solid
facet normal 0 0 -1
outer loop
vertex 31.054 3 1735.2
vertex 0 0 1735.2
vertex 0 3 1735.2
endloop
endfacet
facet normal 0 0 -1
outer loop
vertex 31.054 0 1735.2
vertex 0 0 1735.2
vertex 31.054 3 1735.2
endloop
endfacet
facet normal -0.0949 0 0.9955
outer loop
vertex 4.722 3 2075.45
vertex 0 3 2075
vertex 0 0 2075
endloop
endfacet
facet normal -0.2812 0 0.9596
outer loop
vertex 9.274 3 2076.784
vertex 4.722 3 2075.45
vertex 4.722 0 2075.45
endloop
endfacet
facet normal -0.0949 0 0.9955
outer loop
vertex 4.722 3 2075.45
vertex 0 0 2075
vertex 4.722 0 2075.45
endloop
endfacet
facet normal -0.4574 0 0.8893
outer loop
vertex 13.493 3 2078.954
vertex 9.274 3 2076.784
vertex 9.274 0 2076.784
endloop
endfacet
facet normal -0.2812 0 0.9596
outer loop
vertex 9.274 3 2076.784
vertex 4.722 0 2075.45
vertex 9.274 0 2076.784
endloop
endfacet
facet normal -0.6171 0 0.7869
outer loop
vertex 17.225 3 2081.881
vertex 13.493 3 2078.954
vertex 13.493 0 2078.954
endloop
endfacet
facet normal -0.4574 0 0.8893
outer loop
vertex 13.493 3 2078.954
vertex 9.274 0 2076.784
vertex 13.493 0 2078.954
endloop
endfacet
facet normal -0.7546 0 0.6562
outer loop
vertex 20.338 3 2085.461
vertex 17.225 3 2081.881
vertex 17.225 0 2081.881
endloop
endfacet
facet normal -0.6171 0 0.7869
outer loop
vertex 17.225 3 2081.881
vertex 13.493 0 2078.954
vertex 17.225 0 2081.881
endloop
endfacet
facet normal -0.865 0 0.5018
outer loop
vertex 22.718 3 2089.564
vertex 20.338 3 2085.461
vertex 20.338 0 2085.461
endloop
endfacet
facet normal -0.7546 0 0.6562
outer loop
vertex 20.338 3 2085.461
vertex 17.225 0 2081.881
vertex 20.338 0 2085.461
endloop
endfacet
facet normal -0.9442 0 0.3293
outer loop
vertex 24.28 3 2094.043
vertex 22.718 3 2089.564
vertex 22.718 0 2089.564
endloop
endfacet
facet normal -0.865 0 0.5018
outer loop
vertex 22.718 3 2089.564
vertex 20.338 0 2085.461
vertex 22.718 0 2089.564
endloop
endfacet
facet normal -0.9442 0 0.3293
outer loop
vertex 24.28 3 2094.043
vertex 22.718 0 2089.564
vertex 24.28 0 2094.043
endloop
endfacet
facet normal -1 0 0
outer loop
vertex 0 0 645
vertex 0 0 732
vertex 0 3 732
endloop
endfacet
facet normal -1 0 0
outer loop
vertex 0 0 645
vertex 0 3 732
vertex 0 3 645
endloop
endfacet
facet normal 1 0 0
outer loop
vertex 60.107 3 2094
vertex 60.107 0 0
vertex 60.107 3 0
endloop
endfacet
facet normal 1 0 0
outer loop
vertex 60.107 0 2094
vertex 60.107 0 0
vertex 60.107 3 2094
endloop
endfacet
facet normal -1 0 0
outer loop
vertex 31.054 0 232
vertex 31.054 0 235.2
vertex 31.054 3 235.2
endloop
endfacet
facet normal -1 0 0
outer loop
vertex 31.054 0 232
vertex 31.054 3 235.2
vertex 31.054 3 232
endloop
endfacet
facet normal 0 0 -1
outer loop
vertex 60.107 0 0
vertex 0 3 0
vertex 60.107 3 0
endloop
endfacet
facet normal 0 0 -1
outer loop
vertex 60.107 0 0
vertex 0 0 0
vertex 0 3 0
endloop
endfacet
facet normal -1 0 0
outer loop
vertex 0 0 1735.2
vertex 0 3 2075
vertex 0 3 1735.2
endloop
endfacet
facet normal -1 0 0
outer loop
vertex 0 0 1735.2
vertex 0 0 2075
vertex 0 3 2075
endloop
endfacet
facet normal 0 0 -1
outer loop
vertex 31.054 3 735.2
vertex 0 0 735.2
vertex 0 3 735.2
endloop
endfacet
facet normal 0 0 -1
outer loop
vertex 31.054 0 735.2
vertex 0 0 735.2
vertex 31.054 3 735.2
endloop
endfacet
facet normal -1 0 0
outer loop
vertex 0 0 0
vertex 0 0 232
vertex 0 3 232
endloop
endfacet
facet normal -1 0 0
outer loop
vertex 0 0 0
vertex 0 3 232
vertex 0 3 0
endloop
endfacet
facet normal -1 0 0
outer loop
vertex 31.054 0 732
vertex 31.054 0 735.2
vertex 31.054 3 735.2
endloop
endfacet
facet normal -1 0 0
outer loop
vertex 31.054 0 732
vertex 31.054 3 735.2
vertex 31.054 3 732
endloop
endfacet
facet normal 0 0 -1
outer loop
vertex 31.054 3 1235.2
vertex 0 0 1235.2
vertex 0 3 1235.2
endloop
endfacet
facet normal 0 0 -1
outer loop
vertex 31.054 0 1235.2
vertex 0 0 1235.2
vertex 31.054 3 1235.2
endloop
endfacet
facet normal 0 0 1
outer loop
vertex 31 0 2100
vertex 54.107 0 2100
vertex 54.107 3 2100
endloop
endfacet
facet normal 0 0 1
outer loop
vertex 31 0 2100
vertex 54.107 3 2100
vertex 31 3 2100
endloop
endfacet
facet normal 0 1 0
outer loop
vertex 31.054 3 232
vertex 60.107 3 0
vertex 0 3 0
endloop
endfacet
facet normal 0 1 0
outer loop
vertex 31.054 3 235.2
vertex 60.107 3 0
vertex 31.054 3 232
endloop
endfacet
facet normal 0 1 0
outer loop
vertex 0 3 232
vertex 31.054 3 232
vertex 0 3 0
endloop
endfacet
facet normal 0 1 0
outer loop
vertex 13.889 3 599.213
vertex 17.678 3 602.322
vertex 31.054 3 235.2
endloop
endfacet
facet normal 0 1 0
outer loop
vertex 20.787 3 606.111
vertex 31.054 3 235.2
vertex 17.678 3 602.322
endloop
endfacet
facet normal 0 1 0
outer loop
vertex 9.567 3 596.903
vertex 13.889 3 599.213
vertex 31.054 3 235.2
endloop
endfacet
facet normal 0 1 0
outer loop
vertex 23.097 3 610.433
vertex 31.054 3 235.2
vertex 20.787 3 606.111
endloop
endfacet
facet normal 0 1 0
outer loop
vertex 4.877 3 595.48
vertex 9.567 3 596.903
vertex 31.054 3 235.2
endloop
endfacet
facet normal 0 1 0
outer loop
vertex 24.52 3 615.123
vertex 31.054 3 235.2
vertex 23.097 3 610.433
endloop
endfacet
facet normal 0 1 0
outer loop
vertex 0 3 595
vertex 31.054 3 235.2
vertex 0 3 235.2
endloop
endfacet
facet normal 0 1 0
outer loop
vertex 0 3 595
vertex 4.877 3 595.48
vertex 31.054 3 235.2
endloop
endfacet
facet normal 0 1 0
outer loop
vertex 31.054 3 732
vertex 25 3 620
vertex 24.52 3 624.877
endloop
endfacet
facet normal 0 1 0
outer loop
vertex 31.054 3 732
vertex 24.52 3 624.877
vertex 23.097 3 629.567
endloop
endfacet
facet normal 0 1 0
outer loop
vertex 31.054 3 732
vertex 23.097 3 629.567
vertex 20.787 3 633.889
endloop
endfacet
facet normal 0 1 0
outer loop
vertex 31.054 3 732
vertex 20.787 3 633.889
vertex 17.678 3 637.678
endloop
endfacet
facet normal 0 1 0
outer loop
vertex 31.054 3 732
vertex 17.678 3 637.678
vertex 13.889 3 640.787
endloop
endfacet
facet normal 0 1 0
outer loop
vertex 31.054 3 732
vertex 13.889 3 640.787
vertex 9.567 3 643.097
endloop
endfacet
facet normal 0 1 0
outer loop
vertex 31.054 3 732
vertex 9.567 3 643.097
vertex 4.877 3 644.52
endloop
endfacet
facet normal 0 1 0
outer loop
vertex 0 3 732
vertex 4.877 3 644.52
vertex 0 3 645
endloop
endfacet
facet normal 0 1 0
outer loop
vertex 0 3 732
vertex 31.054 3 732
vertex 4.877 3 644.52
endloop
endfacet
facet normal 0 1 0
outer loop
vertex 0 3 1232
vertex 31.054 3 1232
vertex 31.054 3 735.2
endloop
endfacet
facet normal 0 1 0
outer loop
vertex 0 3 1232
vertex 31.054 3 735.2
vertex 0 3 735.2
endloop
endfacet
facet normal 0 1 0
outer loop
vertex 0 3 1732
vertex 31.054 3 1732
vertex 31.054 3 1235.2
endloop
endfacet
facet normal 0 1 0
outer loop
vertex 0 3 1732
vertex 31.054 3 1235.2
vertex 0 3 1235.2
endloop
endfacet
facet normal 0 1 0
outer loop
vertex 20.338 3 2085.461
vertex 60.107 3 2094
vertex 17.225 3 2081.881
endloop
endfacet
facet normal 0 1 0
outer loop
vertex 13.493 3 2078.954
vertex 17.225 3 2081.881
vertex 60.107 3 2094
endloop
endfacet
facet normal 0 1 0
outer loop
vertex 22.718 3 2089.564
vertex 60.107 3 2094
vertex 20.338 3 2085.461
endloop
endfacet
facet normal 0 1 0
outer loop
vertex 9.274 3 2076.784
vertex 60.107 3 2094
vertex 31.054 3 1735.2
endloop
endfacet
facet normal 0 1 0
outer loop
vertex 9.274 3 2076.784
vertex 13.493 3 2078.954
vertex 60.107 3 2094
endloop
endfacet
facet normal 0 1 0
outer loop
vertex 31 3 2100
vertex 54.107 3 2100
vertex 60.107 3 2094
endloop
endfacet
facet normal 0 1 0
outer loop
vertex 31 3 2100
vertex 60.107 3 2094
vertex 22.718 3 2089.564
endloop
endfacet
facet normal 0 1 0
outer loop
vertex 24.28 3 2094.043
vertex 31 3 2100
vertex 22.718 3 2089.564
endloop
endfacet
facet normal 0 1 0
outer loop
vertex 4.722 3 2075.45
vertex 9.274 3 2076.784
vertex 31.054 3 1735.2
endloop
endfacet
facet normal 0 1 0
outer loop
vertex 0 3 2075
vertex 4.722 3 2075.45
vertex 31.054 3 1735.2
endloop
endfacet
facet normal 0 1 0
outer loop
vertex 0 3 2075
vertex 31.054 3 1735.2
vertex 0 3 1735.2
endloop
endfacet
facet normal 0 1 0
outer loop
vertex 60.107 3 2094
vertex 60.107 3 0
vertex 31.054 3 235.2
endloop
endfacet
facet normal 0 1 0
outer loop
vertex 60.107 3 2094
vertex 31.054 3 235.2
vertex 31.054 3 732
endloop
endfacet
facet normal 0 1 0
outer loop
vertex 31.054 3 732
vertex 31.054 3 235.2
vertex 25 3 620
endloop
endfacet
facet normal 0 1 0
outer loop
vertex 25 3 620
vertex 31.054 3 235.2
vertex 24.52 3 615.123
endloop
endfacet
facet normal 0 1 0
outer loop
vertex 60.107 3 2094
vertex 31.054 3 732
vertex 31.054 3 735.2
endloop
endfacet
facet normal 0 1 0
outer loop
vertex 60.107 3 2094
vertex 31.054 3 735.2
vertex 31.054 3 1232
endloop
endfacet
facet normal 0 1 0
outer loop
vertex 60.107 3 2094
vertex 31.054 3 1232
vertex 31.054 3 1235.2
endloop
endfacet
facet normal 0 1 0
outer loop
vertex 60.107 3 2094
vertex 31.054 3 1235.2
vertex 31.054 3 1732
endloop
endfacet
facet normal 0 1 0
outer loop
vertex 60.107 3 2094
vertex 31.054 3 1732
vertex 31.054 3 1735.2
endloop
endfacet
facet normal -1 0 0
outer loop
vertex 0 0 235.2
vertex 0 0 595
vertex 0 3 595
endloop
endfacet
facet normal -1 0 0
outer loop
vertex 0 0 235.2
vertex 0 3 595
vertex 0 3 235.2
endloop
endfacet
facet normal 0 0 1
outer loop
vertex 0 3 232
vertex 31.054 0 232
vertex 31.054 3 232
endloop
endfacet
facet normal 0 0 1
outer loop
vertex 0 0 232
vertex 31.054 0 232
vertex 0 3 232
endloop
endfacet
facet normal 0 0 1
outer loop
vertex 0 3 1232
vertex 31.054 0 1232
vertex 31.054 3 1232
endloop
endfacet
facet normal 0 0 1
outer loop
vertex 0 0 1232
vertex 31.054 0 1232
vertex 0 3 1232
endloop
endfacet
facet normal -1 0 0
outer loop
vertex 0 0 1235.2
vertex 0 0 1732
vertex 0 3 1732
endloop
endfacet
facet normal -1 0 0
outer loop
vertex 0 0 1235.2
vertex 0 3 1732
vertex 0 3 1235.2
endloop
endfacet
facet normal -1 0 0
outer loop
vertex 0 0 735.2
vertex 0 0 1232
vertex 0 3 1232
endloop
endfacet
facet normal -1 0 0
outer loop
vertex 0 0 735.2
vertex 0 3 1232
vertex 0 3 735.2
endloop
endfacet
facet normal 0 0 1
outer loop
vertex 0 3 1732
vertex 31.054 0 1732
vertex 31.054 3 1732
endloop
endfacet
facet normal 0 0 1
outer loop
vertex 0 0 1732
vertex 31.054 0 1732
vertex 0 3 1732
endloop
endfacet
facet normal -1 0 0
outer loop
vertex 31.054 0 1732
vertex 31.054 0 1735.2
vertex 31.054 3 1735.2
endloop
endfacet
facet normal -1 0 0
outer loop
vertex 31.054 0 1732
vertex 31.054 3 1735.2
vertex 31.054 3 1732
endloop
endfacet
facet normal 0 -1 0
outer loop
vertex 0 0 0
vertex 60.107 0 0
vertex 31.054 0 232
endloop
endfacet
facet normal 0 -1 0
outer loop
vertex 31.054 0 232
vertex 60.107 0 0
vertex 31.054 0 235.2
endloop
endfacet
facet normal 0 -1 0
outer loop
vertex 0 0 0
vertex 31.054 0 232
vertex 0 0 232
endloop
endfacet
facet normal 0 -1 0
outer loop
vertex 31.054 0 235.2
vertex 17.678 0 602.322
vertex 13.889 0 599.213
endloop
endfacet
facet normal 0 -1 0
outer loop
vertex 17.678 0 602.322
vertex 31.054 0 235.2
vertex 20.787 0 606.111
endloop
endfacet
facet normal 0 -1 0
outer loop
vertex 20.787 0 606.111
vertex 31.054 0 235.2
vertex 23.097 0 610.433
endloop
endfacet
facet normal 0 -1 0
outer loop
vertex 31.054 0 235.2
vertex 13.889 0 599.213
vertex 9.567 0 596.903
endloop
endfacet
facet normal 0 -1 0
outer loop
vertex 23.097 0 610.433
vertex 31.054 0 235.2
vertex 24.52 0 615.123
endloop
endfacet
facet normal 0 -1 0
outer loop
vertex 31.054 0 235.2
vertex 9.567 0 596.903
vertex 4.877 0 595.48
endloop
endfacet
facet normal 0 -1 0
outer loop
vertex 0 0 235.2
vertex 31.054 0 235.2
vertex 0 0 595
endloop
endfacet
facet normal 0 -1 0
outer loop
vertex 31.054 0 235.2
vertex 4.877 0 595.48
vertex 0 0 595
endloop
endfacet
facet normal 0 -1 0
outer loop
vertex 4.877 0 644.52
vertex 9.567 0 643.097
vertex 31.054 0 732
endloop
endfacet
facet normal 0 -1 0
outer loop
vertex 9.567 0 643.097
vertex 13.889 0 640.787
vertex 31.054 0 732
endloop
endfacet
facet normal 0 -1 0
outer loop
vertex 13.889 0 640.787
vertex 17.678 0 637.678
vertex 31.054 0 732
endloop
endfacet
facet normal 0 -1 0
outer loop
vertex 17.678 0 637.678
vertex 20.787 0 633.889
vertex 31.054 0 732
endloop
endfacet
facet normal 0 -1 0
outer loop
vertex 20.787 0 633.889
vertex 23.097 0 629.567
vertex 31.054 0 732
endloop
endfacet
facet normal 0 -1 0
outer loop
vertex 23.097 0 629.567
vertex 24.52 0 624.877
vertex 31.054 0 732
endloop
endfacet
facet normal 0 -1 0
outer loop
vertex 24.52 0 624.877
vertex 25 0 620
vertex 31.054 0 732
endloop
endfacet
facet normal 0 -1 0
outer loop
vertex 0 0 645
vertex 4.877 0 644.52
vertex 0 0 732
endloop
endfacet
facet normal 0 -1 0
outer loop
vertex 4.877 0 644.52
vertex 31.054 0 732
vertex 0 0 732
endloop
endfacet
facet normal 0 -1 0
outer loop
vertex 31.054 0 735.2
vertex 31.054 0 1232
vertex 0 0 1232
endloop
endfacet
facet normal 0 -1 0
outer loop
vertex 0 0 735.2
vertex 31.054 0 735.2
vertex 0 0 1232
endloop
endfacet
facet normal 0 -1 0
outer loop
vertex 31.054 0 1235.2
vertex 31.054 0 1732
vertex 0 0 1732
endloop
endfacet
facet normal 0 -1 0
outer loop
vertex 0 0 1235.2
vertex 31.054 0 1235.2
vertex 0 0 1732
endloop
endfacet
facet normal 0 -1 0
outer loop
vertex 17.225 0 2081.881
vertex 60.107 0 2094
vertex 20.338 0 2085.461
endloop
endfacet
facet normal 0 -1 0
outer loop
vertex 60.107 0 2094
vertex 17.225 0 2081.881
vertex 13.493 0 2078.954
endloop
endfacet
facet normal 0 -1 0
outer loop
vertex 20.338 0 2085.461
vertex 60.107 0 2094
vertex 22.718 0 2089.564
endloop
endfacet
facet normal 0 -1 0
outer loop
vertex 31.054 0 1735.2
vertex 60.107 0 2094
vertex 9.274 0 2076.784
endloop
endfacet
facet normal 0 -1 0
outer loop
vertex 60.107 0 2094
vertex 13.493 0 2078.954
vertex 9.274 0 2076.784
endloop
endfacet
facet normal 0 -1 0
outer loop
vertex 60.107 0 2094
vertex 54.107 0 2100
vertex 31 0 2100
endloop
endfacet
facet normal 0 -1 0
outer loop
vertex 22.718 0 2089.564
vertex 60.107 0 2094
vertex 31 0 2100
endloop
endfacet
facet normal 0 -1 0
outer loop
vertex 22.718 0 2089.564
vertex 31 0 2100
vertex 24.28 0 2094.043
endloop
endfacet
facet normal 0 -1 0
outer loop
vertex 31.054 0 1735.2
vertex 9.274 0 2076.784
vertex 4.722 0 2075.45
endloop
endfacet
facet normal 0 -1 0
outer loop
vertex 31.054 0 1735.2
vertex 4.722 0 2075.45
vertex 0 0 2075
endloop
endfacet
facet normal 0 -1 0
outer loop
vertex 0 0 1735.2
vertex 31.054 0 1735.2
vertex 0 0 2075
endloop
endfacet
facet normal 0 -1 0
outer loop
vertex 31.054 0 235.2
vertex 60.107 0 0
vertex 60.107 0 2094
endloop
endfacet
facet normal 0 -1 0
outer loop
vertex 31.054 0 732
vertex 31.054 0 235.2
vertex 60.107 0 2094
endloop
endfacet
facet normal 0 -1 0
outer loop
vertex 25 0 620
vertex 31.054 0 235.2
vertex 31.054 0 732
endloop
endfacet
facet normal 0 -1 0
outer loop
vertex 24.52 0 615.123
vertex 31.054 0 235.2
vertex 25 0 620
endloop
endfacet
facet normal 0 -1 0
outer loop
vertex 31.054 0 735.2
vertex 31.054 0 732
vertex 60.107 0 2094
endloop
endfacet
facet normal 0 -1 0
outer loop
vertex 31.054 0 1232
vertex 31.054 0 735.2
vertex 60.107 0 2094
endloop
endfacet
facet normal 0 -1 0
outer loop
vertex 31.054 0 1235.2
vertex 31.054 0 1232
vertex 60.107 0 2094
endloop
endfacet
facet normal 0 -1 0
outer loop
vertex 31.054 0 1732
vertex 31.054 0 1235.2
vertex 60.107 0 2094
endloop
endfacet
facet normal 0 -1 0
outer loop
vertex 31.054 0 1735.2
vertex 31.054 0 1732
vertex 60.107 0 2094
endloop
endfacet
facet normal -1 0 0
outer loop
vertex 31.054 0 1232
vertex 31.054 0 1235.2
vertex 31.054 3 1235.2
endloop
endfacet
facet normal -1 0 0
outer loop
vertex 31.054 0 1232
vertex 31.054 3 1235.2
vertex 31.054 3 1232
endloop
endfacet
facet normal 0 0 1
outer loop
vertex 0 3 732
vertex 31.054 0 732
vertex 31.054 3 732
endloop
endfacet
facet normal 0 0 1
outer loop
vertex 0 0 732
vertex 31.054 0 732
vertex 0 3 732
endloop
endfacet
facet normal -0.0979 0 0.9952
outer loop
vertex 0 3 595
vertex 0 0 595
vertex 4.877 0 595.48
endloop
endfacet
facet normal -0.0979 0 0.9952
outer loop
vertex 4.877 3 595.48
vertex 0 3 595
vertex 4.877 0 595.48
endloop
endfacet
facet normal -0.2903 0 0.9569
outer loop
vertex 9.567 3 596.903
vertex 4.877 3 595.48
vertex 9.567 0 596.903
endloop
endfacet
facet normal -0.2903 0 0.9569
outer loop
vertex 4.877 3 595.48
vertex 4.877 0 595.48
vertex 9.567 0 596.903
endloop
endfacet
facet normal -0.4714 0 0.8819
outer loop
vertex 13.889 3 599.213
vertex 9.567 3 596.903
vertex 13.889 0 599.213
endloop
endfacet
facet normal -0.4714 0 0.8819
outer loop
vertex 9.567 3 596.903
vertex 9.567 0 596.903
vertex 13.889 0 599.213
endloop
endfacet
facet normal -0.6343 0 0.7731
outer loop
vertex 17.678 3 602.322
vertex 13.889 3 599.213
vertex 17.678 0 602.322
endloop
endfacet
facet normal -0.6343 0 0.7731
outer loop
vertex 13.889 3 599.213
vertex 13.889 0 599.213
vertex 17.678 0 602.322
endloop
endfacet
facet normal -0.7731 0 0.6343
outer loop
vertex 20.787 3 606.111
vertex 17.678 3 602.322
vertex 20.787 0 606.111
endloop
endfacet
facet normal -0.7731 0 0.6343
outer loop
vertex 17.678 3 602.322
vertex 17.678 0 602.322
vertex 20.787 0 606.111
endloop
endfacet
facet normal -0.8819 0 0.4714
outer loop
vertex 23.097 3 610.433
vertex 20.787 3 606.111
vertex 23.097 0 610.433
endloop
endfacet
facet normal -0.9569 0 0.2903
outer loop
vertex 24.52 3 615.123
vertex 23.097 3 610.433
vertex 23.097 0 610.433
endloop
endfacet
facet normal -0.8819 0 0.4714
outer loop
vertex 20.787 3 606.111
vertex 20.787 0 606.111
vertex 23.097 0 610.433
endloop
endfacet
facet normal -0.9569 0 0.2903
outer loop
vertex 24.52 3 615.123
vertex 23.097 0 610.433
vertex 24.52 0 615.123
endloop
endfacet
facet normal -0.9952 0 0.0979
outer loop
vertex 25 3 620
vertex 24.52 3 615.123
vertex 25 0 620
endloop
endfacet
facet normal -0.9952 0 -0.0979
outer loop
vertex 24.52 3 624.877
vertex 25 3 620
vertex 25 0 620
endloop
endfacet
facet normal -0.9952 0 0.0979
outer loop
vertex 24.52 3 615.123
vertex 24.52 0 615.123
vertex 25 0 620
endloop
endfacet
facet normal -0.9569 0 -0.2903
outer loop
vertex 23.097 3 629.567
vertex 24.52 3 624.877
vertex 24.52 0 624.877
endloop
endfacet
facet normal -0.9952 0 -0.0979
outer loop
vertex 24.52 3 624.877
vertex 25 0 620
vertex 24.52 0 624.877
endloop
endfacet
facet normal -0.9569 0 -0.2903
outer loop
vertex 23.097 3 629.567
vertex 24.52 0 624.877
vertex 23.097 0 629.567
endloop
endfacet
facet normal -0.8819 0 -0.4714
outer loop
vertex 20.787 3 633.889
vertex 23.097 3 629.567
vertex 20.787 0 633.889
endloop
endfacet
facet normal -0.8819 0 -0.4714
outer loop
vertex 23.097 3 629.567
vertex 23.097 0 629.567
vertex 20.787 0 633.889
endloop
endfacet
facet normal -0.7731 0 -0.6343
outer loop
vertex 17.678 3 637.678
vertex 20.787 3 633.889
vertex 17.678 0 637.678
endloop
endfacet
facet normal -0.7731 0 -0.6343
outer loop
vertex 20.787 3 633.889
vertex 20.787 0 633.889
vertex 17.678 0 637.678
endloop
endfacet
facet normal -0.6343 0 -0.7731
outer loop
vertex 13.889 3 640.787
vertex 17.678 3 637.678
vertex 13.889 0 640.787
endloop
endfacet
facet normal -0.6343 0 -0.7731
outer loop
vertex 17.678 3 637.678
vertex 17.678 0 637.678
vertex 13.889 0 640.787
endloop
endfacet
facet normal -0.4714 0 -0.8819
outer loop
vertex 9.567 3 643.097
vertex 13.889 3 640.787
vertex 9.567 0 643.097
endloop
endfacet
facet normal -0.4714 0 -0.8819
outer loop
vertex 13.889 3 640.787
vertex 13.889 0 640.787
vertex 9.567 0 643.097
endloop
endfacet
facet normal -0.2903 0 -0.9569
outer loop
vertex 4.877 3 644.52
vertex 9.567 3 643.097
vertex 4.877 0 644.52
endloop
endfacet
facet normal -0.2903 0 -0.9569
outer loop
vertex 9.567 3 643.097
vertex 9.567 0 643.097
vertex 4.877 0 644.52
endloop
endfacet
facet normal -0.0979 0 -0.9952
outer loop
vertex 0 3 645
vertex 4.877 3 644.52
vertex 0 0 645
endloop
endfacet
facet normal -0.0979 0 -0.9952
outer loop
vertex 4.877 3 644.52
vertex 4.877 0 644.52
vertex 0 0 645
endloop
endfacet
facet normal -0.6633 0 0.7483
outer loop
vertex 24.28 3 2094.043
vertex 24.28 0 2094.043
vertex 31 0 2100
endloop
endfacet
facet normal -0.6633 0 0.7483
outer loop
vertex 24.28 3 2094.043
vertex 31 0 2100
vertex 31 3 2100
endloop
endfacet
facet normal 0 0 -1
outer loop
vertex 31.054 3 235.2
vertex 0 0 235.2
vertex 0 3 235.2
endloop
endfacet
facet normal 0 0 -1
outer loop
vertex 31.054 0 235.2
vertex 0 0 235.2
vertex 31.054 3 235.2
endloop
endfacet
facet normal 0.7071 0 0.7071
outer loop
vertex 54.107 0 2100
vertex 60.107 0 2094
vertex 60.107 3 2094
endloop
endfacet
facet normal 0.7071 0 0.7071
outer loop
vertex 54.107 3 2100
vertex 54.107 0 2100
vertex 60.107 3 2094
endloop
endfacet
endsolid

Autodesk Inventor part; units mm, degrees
ref_plane "YZ Plane" through (0, 0, 0) normal (1, 0, 0) x (0, 1, 0)
ref_plane "XZ Plane" through (0, 0, 0) normal (0, 1, 0) x (-1, 0, 0)
ref_plane "XY Plane" through (0, 0, 0) normal (0, 0, 1) x (1, 0, 0)
sketch "Sketch6" plane through (0, 0, 0) normal (0, 1, 0) x (-1, 0, 0)
  line L0 (0, 0) -> (-60.1073, 0)
  line L1 (-60.1073, 0) -> (-60.1073, 2100)
  line L2 (-60.1073, 2100) -> (0, 2100)
  line L3 (0, 2100) -> (0, 0)
  dimension "d26" = 60.1073
  dimension "d27" = 2100
extrude "Plate4" add sketch "Sketch6" along normal blind 3
sketch "Sketch9" plane through (0, 3, 0) normal (0, 1, 0) x (1, 0, 0)
  line L0 (0, -2100) -> (0, 0) projected
  line L1 (60.1073, -2100) -> (0, -2100) projected
  line L2 (60.1073, 0) -> (60.1073, -2100) projected
  line L3 (0, 0) -> (60.1073, 0) projected
  line L4 (25, -210) -> (10, -210) construction
  line L5 (10, -210) -> (10, -10) construction
  line L6 (10, -10) -> (25, -10) construction
  line L7 (25, -10) -> (25, -210) construction
  dimension "d44" = 200
  dimension "d45" = 15
  dimension "d46" = 10
  dimension "d47" = 10
mark "Mark1"
sketch "Sketch7" plane through (0, 0, 0) normal (0, -1, 0) x (1, 0, 0)
  line L0 (0, 2100) -> (60.1073, 2100) projected
  line L1 (0, 0) -> (0, 2100) projected
  line L2 (60.1073, 0) -> (0, 0) projected
  line L3 (60.1073, 2100) -> (60.1073, 0) projected
  line L4 (0, 235.2) -> (31.0536, 235.2)
  line L5 (31.0536, 235.2) -> (31.0536, 232)
  line L6 (31.0536, 232) -> (0, 232)
  line L7 (0, 232) -> (0, 235.2)
  point P0 (0, 232)
  point P1 (0, 200)
  point P2 (46.4173, 200)
  point P3 (0, 232)
  dimension "d29" = 31.0536
  dimension "d30" = 3.2
  dimension "d31" = 232
extrude "Extrusion2" cut sketch "Sketch7" against normal through all contours L4 L5 L6 L1
pattern_linear "Rectangular Pattern1" count 5 spacing 500 along (0, 0, 1) of "Extrusion2"
sketch "Sketch8" plane through (0, 0, 0) normal (0, -1, 0) x (1, 0, 0)
  line L0 (0, 1735.2) -> (0, 2100) projected
  line L1 (0, 235.2) -> (31.0536, 235.2) projected
  line L2 (31.0536, 235.2) -> (31.0536, 232) projected
  line L3 (31.0536, 232) -> (0, 232) projected
  line L4 (0, 0) -> (0, 232) projected
  line L5 (60.1073, 0) -> (0, 0) projected
  line L6 (60.1073, 2100) -> (60.1073, 0) projected
  line L7 (0, 2100) -> (60.1073, 2100) projected
  circle A0 centre (0, 620) radius 25
  line L8 (0, 1735.2) -> (31.0536, 1735.2) projected
  line L9 (31.0536, 1735.2) -> (31.0536, 1732) projected
  line L10 (31.0536, 1732) -> (0, 1732) projected
  line L11 (0, 1235.2) -> (0, 1732) projected
  line L12 (0, 1235.2) -> (31.0536, 1235.2) projected
  line L13 (31.0536, 1235.2) -> (31.0536, 1232) projected
  line L14 (31.0536, 1232) -> (0, 1232) projected
  line L15 (0, 735.2) -> (0, 1232) projected
  line L16 (0, 735.2) -> (31.0536, 735.2) projected
  line L17 (31.0536, 735.2) -> (31.0536, 732) projected
  line L18 (31.0536, 732) -> (0, 732) projected
  line L19 (0, 235.2) -> (0, 732) projected
  dimension "d37" = 50
  dimension "d38" = 620
extrude "Extrusion3" cut sketch "Sketch8" against normal through all contours L19 A0 | A0 L19
pattern_linear "Rectangular Pattern2" count 2 spacing 1480 along (0, 0, 1) of "Extrusion3"
chamfer "Corner Chamfer1" distance 6 angle 45 2 edges at (25, 1.5, 2100) (60.1073, 1.5, 2100)
equation "\"d26\" = Stringer4_deep"
equation "\"d28\" = Thickness"
equation "\"BendReliefWidth\" = Thickness"
equation "\"BendReliefDepth\" = 0.5 * Thickness"
equation "\"CornerReliefSize\" = 4 * Thickness"
equation "\"MinimumRemnant\" = 2 * Thickness"
equation "\"TransitionRadius\" = BendRadius"
equation "\"JacobiRadiusSize\" = BendRadius"
equation "\"GapSize\" = Thickness"
equation "\"Stringer4_deep\" = 60.107271"
equation "\"Thickness\" = 3"
equation "\"BendRadius\" = 5"
properties part number "BSH 0363 stringer board 4" material "09g2s"
